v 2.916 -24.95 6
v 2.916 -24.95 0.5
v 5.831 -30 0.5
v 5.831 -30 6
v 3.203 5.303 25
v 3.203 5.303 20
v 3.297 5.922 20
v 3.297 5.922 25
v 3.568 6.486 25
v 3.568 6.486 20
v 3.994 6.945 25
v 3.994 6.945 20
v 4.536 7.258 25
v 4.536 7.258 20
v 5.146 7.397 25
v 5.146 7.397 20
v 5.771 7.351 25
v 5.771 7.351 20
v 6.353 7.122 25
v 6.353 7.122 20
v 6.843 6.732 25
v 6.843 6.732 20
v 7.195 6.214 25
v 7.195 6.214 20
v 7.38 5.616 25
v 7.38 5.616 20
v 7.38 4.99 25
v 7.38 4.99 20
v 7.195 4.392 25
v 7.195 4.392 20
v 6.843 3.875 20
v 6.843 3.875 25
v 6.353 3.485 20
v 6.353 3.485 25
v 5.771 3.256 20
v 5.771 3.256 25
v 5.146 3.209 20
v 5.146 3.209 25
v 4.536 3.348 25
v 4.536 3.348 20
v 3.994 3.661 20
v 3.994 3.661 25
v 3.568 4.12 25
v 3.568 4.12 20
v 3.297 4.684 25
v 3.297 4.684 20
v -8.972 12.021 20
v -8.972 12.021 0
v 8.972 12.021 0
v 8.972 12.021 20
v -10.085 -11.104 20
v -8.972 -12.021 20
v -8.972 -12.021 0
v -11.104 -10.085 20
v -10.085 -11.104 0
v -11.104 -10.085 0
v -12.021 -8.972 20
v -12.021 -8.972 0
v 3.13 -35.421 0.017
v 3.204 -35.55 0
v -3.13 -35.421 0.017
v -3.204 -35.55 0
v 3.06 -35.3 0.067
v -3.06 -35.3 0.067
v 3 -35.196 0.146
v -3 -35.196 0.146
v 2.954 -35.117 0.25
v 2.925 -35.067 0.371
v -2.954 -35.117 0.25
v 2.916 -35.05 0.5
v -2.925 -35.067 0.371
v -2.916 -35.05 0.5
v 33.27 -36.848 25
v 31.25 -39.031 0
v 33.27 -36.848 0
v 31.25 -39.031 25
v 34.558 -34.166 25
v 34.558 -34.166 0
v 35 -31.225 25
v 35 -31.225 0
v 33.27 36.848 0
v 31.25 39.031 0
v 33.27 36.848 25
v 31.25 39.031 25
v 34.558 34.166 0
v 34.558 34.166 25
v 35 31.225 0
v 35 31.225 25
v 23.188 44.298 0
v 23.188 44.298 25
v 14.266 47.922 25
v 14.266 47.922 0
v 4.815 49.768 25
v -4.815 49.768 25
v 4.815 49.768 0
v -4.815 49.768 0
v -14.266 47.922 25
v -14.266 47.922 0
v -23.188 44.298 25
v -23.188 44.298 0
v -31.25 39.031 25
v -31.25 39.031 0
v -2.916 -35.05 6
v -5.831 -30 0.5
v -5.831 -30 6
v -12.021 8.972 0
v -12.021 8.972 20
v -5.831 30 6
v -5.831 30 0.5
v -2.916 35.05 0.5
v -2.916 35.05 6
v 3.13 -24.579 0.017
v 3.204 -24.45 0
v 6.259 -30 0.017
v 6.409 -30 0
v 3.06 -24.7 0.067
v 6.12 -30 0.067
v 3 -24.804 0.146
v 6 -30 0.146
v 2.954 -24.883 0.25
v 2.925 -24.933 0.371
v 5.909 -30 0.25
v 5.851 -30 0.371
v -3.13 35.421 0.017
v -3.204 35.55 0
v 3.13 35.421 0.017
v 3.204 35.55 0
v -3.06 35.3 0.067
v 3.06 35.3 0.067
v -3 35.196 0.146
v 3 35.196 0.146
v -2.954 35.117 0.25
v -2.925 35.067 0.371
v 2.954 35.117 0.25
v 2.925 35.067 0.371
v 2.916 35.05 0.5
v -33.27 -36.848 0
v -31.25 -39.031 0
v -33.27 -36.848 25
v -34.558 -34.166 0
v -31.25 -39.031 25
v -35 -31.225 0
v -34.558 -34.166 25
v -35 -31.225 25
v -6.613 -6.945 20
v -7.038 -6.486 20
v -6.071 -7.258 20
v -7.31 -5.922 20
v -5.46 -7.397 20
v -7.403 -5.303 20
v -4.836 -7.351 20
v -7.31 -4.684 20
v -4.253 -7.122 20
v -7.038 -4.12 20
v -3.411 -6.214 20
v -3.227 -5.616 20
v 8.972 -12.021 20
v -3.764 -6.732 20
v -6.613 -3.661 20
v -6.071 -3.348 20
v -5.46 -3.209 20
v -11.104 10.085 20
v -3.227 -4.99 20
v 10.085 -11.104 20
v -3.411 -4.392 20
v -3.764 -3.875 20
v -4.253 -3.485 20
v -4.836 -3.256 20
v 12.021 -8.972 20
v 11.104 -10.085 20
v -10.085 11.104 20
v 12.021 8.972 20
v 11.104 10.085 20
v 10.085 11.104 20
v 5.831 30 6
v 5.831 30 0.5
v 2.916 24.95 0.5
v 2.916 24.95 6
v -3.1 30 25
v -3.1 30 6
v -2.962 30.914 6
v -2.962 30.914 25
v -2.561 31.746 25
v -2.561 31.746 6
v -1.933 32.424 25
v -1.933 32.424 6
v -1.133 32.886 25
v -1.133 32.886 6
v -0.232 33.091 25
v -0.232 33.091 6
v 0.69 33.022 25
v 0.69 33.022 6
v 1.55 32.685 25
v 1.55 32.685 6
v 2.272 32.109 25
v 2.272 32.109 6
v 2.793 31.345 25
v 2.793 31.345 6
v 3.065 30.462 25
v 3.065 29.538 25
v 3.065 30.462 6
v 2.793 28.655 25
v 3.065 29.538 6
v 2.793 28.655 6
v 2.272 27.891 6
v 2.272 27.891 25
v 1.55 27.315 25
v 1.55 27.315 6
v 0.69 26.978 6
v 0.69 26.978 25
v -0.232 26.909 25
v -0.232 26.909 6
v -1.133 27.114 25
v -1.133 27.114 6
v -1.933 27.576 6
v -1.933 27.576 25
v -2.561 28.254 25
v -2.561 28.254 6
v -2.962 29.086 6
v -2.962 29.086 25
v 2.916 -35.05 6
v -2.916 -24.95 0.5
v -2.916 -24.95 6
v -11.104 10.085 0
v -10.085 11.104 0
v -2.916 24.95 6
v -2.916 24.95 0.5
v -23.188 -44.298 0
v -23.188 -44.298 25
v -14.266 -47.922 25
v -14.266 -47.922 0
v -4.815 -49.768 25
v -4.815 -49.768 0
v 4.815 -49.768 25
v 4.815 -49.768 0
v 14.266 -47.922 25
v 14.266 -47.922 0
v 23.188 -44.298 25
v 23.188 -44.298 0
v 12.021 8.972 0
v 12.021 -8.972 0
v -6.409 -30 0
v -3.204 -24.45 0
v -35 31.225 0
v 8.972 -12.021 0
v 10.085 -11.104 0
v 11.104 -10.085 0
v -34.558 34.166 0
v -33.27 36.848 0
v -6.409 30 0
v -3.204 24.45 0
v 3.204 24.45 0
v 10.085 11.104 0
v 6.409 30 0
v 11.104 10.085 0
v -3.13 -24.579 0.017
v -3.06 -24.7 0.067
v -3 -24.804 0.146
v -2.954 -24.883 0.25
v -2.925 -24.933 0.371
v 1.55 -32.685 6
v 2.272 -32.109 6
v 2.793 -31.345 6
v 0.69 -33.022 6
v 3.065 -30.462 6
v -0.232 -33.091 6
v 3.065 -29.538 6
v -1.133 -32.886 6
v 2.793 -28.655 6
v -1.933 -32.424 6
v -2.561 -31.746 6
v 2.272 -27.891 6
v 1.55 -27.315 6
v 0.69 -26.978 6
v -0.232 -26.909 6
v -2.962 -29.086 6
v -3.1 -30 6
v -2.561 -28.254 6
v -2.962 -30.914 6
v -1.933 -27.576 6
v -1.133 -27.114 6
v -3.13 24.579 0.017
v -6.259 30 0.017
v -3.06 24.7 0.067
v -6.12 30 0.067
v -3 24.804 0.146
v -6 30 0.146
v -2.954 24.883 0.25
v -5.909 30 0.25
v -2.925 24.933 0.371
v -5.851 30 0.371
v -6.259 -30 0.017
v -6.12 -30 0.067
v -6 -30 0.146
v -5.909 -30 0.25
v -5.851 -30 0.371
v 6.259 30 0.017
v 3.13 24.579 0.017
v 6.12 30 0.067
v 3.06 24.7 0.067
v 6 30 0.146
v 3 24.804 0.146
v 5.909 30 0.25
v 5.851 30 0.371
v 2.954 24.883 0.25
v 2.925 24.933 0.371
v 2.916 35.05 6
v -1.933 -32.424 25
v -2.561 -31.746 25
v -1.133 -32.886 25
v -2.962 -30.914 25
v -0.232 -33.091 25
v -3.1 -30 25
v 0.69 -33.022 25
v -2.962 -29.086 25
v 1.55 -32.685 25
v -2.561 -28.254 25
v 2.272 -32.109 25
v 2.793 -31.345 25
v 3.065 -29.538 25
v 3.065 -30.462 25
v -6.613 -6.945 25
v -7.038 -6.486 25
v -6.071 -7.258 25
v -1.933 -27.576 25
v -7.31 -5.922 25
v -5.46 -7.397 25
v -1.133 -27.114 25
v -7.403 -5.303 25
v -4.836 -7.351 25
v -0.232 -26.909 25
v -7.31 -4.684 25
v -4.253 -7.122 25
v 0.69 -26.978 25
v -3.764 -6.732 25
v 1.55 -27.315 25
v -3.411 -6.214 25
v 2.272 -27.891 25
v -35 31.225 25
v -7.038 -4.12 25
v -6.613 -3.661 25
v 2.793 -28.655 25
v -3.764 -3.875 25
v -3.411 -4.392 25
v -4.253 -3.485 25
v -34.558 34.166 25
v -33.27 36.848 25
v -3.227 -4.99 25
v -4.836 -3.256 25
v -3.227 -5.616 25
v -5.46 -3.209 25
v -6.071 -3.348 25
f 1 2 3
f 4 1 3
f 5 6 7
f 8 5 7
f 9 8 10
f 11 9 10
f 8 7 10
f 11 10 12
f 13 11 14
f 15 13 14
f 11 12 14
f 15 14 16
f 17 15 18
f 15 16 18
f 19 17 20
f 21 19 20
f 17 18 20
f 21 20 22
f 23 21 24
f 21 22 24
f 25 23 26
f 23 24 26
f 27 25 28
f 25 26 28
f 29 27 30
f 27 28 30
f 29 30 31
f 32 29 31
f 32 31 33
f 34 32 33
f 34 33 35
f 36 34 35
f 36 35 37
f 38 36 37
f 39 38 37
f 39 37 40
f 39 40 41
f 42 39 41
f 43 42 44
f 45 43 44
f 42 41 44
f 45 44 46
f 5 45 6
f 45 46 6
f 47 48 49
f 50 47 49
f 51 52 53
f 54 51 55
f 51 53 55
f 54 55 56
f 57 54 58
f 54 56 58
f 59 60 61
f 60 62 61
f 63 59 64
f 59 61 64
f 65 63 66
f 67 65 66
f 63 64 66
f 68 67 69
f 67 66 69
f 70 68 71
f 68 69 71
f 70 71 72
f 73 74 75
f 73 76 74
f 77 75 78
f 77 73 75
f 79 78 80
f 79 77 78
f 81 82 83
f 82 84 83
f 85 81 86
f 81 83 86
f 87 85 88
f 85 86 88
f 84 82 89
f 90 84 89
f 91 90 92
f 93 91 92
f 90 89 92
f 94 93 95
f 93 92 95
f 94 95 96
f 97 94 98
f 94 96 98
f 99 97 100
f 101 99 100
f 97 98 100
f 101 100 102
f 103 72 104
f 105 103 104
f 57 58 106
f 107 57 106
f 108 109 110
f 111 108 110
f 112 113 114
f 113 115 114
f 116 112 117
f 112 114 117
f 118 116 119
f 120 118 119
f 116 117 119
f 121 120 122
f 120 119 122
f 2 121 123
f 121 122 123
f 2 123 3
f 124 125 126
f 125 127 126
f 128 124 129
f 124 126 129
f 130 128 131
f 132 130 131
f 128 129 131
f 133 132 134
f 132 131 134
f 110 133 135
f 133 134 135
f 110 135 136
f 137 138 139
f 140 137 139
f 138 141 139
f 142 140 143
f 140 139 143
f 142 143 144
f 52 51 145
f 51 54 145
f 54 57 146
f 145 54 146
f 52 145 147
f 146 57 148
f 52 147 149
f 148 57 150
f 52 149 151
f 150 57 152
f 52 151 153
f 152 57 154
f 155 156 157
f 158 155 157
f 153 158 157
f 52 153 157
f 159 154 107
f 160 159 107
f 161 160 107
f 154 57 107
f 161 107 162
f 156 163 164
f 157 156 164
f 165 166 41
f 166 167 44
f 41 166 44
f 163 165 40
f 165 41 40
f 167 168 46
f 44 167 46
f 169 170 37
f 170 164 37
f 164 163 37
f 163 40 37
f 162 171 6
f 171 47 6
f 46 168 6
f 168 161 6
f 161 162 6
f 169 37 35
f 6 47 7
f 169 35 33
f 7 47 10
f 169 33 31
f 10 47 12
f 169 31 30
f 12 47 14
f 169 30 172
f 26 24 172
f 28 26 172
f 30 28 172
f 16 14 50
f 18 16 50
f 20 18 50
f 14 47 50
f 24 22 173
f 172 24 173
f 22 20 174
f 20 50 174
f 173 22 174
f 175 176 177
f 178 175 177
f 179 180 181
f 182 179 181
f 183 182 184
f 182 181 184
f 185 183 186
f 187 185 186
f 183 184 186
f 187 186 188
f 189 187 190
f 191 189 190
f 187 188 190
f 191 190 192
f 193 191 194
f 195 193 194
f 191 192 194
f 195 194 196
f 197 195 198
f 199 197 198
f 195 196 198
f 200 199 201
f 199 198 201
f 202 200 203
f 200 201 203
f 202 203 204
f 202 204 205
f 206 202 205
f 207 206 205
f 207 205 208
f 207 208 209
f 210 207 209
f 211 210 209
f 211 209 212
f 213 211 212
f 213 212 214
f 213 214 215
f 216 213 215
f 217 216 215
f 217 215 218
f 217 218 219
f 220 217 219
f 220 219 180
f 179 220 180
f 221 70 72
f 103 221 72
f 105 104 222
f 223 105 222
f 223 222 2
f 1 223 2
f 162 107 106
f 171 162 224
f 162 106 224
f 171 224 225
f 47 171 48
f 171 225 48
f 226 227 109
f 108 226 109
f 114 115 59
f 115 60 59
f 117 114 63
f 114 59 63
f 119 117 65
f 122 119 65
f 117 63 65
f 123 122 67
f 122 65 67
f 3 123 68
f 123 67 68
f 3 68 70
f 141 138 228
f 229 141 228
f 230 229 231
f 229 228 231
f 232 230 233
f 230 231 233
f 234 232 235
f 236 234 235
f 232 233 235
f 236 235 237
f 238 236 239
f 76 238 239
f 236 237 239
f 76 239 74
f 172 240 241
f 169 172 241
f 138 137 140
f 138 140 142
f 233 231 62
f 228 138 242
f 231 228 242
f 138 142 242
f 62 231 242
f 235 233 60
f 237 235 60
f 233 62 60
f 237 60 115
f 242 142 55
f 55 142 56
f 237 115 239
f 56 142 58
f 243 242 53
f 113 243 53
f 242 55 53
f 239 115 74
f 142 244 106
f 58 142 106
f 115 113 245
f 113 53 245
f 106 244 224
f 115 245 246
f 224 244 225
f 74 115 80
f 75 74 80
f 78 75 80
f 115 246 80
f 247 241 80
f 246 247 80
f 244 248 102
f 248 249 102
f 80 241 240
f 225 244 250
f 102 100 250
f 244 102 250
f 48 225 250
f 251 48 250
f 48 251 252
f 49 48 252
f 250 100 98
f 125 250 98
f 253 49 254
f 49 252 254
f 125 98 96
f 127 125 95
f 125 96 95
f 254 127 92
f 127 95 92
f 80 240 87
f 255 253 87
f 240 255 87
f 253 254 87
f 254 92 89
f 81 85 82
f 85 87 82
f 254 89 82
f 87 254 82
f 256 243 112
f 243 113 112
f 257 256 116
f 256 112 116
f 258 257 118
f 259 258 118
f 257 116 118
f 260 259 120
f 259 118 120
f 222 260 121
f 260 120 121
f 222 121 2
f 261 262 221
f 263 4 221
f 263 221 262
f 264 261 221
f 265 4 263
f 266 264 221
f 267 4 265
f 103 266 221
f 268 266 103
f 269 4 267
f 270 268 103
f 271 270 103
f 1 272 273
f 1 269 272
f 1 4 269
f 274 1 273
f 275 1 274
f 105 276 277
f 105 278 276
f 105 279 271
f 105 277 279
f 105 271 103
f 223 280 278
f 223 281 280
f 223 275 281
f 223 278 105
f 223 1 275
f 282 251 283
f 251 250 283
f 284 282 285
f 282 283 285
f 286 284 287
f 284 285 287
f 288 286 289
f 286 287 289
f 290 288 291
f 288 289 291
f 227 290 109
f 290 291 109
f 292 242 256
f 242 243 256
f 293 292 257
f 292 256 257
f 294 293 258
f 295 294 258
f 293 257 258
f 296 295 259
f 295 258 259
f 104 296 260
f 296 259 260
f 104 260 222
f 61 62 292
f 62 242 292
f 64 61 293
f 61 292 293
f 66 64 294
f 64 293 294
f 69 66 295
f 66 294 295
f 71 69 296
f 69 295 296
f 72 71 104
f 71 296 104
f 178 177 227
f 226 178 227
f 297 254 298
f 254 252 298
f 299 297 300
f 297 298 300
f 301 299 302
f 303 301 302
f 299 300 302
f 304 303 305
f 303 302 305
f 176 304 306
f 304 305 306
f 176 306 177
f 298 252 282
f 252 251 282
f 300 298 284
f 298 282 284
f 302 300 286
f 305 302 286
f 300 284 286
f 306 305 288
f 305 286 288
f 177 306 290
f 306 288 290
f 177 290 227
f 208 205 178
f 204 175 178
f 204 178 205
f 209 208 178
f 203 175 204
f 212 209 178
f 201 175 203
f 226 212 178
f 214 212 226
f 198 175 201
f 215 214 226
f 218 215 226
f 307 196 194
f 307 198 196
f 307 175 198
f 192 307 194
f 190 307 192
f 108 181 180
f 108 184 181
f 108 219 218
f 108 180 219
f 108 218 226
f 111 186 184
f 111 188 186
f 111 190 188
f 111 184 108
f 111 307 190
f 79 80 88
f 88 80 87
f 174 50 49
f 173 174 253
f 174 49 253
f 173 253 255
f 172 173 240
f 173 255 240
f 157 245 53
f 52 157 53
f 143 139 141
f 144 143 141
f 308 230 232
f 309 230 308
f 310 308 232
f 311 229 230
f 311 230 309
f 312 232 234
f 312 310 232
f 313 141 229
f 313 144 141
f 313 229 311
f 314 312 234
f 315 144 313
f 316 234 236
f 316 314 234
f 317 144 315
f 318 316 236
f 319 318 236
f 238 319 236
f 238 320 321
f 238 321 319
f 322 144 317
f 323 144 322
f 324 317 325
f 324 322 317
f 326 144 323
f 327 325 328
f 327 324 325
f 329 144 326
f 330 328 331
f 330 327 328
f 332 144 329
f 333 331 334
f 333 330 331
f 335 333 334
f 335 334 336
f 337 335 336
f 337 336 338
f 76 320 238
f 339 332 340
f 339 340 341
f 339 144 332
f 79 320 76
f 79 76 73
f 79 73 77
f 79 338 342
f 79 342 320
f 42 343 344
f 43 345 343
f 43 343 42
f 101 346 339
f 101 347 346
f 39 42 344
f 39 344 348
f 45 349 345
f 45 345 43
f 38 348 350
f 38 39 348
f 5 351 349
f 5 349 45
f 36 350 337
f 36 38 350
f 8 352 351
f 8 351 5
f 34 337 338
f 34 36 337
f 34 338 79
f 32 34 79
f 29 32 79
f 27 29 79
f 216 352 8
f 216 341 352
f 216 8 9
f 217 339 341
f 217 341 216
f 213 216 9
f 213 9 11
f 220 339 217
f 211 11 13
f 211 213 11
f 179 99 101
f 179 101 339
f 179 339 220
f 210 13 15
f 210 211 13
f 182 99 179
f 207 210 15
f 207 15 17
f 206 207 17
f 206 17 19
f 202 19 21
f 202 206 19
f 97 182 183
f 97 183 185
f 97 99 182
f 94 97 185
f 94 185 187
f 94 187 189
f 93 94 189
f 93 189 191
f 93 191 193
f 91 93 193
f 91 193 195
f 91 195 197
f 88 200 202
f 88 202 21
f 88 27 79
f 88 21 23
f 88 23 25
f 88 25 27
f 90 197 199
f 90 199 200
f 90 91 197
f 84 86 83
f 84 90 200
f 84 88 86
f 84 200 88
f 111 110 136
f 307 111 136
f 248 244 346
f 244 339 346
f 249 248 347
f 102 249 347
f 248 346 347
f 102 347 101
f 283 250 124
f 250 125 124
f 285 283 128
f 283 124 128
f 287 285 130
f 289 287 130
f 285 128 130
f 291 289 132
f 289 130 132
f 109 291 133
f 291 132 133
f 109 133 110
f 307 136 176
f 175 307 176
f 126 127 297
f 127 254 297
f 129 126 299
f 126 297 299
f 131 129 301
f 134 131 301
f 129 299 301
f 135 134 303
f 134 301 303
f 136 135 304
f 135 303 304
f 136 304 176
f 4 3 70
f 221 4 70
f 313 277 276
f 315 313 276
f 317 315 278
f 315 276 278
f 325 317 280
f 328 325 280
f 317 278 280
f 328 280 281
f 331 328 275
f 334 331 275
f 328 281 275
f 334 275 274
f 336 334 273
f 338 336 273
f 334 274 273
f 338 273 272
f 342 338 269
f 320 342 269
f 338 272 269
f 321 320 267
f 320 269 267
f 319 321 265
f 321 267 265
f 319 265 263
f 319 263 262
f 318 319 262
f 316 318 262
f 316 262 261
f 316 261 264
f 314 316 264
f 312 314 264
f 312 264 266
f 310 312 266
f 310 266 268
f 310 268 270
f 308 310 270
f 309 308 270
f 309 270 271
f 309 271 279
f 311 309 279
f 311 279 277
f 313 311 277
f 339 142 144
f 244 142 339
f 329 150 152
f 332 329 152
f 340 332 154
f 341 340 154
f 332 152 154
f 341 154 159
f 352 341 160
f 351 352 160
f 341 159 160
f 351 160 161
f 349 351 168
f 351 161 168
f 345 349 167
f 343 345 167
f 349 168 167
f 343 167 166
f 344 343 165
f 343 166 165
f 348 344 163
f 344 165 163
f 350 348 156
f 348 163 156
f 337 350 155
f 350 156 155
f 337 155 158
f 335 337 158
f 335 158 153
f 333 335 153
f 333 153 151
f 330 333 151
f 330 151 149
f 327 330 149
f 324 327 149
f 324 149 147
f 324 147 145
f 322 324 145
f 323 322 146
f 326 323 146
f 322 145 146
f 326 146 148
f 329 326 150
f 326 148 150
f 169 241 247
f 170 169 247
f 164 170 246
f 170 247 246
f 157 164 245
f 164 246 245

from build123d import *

# Parameters (mm, degrees)
SKETCH1_R           = 50
BOSS_EXTRUDE1_DEPTH = 20
SKETCH2_R           = 50
BOSS_EXTRUDE2_DEPTH = 5
SKETCH3_R           = 2.1
CUT_EXTRUDE1_DEPTH  = 5
SKETCH4_R           = 3.1
CUT_EXTRUDE2_DEPTH  = 76
CUT_EXTRUDE3_DEPTH  = 6
FILLET1_R           = 0.5
CUT_EXTRUDE4_DEPTH  = 76
FILLET2_R           = 10


with BuildPart() as part:
    # Sketch1 → Boss-Extrude1 (new body)
    with BuildSketch(Plane.XY):
        Circle(SKETCH1_R)
        with BuildLine():
            Line((-8.972179222, 12.02081528), (8.972179222, 12.02081528))
            ThreePointArc((8.972179222, 12.02081528), (10.606601718, 10.606601718), (12.02081528, 8.972179222))
            Line((12.02081528, 8.972179222), (12.02081528, -8.972179222))
            ThreePointArc((12.02081528, -8.972179222), (10.606601708, -10.606601708), (8.972179222, -12.02081528))
            Line((8.972179222, -12.02081528), (-8.972179222, -12.02081528))
            ThreePointArc((-8.972179222, -12.02081528), (-10.606601718, -10.606601718), (-12.02081528, -8.972179222))
            Line((-12.02081528, -8.972179222), (-12.02081528, 8.972179222))
            ThreePointArc((-12.02081528, 8.972179222), (-10.606601718, 10.606601718), (-8.972179222, 12.02081528))
        make_face(mode=Mode.SUBTRACT)
    extrude(amount=BOSS_EXTRUDE1_DEPTH)

    # Sketch2 → Boss-Extrude2 (add)
    with BuildSketch(Plane.XY.offset(20)):
        Circle(SKETCH2_R)
    extrude(amount=BOSS_EXTRUDE2_DEPTH)

    # Sketch3 → Cut-Extrude1 (cut)
    with BuildSketch(Plane(origin=(0, 0, 20), x_dir=(-1, 0, 0), z_dir=(0, 0, -1))):
        with Locations((-5.303300859, 5.303300859)):
            Circle(SKETCH3_R)
        with Locations((5.303300859, -5.303300859)):
            Circle(SKETCH3_R)
    extrude(amount=-CUT_EXTRUDE1_DEPTH, mode=Mode.SUBTRACT)

    # Sketch4 → Cut-Extrude2 (cut, through all)
    with BuildSketch(Plane(origin=(0, 0, 0), x_dir=(-1, 0, 0), z_dir=(0, 0, -1))):
        with Locations((0, 30)):
            Circle(SKETCH4_R)
        with Locations((0, -30)):
            Circle(SKETCH4_R)
    extrude(amount=-CUT_EXTRUDE2_DEPTH, mode=Mode.SUBTRACT)

    # Sketch5 → Cut-Extrude3 (cut)
    with BuildSketch(Plane(origin=(0, 0, 0), x_dir=(-1, 0, 0), z_dir=(0, 0, -1))):
        Polygon((5.831237719, 30), (2.915618859, 35.05), (-2.915618859, 35.05), (-5.831237719, 30), (-2.915618859, 24.95), (2.915618859, 24.95), align=None)
        Polygon((5.831237719, -30), (2.915618859, -24.95), (-2.915618859, -24.95), (-5.831237719, -30), (-2.915618859, -35.05), (2.915618859, -35.05), align=None)
    extrude(amount=-CUT_EXTRUDE3_DEPTH, mode=Mode.SUBTRACT)

    # Fillet1
    fillet1_edges = [part.edges().sort_by_distance(p)[0] for p in [
        (-4.373428289, 27.475, 0),
        (-4.373428289, 32.525, 0),
        (0, 35.05, 0),
        (4.373428289, 32.525, 0),
        (4.373428289, 27.475, 0),
        (0, 24.95, 0),
        (-4.373428289, -32.525, 0),
        (-4.373428289, -27.475, 0),
        (0, -24.95, 0),
        (4.373428289, -27.475, 0),
        (4.373428289, -32.525, 0),
        (0, -35.05, 0),
    ]]
    fillet(fillet1_edges, radius=FILLET1_R)

    # Sketch6 → Cut-Extrude4 (cut, through all)
    with BuildSketch(Plane(origin=(0, 0, 0), x_dir=(-1, 0, 0), z_dir=(0, 0, -1))):
        with BuildLine():
            Line((-35, 0), (-35, 35.707142143))
            ThreePointArc((-35, 35.707142143), (-50, 0), (-35, -35.707142143))
            Line((-35, -35.707142143), (-35, 0))
        make_face()
    cut_extrude4 = extrude(amount=-CUT_EXTRUDE4_DEPTH, mode=Mode.SUBTRACT)

    # Mirror1: Cut-Extrude4 across plane
    add(cut_extrude4.mirror(Plane(origin=(0, 0, 0), x_dir=(0, 0, 1), z_dir=(1, 0, 0))), mode=Mode.SUBTRACT)

    # Fillet2
    fillet2_edges = [part.edges().sort_by_distance(p)[0] for p in [
        (35, -35.707142143, 12.5),
        (35, 35.707142143, 12.5),
        (-35, -35.707142143, 12.5),
        (-35, 35.707142143, 12.5),
    ]]
    fillet(fillet2_edges, radius=FILLET2_R)


solid = part.part
